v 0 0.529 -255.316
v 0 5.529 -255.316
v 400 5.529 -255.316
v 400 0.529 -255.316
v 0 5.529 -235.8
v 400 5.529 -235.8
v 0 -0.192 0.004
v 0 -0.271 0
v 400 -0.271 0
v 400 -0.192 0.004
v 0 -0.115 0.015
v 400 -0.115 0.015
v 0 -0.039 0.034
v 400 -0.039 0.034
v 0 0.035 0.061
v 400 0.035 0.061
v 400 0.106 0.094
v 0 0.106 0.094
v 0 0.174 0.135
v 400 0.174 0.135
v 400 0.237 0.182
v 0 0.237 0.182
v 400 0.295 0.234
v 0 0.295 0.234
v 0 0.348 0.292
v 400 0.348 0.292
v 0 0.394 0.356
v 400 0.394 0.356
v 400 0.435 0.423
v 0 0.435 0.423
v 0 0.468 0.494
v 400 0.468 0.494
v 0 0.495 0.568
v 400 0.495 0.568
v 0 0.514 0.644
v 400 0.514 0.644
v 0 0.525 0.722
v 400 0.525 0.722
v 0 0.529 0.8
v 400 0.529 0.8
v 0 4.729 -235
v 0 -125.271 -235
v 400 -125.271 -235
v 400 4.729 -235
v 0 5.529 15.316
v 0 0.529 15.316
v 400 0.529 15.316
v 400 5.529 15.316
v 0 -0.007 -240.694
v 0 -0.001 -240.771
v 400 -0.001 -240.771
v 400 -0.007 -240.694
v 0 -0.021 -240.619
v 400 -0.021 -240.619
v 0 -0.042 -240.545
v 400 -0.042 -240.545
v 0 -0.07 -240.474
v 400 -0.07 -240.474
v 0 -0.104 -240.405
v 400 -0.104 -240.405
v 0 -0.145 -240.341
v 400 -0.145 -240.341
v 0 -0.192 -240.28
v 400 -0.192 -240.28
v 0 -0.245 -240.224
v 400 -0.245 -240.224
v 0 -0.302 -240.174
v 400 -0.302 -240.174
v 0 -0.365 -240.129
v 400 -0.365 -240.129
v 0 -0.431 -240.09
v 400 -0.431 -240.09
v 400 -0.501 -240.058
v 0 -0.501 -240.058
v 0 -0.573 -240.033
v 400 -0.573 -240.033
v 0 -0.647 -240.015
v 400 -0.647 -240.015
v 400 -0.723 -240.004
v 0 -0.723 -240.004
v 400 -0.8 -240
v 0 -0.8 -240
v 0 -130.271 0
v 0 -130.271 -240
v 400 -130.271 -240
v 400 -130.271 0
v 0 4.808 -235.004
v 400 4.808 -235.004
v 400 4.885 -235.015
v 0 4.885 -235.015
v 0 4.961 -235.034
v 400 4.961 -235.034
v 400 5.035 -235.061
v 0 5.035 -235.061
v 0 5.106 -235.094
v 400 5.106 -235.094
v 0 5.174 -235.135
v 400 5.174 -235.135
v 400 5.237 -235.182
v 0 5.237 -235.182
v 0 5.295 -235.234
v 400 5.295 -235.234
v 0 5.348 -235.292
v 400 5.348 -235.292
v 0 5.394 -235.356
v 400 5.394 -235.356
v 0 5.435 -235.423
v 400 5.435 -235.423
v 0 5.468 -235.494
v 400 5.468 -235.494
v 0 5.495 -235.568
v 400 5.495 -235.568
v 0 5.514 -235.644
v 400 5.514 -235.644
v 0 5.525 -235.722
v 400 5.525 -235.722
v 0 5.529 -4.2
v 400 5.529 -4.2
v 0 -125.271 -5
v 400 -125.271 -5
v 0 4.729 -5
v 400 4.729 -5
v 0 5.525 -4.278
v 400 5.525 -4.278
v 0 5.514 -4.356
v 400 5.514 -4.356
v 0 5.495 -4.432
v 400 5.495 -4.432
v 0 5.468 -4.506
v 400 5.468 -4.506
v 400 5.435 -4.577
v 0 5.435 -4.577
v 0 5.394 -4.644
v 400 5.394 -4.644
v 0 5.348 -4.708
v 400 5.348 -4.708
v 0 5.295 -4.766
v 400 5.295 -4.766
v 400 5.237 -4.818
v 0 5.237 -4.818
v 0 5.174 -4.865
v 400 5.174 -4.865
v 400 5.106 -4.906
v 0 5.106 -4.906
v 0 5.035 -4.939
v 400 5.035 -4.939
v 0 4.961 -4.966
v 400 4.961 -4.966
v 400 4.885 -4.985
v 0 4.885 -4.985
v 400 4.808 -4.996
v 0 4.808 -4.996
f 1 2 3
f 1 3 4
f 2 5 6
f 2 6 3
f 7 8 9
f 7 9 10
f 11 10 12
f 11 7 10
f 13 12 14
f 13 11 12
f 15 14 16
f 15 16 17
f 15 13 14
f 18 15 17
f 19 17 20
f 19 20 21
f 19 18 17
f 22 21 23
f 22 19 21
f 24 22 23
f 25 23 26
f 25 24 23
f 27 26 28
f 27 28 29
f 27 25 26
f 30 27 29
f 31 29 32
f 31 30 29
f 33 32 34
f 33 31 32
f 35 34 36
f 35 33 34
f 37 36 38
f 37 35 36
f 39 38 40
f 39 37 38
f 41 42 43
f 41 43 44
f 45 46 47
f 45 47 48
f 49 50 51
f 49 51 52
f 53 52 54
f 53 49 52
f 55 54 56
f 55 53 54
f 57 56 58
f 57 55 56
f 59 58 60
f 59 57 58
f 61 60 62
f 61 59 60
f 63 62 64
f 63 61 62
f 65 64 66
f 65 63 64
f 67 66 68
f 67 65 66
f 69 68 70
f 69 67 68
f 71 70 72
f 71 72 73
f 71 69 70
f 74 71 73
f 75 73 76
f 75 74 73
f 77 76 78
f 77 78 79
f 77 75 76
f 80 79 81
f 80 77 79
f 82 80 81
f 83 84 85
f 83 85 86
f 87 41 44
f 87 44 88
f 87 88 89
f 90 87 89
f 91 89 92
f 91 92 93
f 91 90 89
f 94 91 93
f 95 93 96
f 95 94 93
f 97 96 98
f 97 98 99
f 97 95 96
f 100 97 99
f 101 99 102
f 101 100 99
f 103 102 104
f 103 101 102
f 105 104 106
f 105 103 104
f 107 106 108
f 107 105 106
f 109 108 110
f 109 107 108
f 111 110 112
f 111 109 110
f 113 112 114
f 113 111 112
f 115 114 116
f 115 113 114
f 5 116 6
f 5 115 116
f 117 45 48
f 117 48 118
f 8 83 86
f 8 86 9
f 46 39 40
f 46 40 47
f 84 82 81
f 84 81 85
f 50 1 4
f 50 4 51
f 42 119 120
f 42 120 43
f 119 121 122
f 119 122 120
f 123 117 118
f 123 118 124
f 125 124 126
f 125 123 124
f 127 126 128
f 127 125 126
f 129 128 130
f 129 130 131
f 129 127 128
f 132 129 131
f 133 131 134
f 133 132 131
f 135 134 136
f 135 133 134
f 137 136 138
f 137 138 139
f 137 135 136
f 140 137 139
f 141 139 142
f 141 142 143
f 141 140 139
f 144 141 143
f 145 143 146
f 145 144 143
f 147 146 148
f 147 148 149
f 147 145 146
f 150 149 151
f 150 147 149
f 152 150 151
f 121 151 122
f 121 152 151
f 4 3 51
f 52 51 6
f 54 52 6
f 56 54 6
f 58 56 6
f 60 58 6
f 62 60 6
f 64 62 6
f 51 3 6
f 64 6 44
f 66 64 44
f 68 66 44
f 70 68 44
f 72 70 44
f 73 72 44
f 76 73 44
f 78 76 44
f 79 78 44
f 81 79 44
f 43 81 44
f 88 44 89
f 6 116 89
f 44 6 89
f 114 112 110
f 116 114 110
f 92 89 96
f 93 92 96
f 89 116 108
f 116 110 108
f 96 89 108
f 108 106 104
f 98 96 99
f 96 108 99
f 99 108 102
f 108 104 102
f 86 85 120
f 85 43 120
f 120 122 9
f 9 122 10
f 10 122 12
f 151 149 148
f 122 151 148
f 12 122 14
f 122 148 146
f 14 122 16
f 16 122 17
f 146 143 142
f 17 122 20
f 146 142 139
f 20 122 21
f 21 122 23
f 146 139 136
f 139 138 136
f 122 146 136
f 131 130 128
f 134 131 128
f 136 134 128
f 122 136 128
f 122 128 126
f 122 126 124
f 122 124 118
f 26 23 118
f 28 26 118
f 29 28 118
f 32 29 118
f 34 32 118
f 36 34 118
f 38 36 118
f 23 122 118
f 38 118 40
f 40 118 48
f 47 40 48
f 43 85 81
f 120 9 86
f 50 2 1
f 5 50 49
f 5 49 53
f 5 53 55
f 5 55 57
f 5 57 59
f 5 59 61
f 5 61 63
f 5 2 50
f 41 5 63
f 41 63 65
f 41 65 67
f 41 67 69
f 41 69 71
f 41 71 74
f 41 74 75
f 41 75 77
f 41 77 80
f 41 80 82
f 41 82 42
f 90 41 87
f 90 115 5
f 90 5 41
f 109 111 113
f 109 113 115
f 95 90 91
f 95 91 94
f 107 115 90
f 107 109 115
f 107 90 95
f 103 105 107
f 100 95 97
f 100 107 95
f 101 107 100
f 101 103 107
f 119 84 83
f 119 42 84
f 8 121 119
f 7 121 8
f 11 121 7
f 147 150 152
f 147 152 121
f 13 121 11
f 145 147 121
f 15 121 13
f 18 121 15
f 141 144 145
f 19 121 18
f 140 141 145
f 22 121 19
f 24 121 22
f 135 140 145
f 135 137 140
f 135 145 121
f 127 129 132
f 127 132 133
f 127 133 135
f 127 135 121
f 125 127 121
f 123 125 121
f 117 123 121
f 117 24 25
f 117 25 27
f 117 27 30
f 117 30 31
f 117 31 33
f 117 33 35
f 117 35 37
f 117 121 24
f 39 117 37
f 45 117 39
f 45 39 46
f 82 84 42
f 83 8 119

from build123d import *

# Parameters (mm, degrees)
BOSS_EXTRUDE1_DEPTH = 400


with BuildPart() as part:
    # Sketch1 → Boss-Extrude1 (new body)
    with BuildSketch(Plane(origin=(0, 0, 0), x_dir=(0, 0, -1), z_dir=(1, 0, 0))):
        with BuildLine():
            Line((5, -5), (5, -125.270799085))
            Line((5, -125.270799085), (235, -125.270799085))
            Line((235, -125.270799085), (235, -5))
            Line((235, -5), (235, 4.729200915))
            ThreePointArc((235, 4.729200915), (235.234314575, 5.29488634), (235.8, 5.529200915))
            Line((235.8, 5.529200915), (255.315878667, 5.529200915))
            Line((255.315878667, 5.529200915), (255.315878667, 0.529200915))
            Line((255.315878667, 0.529200915), (240.770883182, -0.000530044))
            ThreePointArc((240.770883182, -0.000530044), (240.224112227, -0.244704337), (240, -0.8))
            Line((240, -0.8), (240, -130.270799085))
            Line((240, -130.270799085), (0, -130.270799085))
            Line((0, -130.270799085), (0, -0.270799085))
            ThreePointArc((0, -0.270799085), (-0.234314575, 0.29488634), (-0.8, 0.529200915))
            Line((-0.8, 0.529200915), (-15.315878667, 0.529200915))
            Line((-15.315878667, 0.529200915), (-15.315878667, 5.529200915))
            Line((-15.315878667, 5.529200915), (4.2, 5.529200915))
            ThreePointArc((4.2, 5.529200915), (4.765685425, 5.29488634), (5, 4.729200915))
            Line((5, 4.729200915), (5, -5))
        make_face()
    extrude(amount=BOSS_EXTRUDE1_DEPTH)


solid = part.part
